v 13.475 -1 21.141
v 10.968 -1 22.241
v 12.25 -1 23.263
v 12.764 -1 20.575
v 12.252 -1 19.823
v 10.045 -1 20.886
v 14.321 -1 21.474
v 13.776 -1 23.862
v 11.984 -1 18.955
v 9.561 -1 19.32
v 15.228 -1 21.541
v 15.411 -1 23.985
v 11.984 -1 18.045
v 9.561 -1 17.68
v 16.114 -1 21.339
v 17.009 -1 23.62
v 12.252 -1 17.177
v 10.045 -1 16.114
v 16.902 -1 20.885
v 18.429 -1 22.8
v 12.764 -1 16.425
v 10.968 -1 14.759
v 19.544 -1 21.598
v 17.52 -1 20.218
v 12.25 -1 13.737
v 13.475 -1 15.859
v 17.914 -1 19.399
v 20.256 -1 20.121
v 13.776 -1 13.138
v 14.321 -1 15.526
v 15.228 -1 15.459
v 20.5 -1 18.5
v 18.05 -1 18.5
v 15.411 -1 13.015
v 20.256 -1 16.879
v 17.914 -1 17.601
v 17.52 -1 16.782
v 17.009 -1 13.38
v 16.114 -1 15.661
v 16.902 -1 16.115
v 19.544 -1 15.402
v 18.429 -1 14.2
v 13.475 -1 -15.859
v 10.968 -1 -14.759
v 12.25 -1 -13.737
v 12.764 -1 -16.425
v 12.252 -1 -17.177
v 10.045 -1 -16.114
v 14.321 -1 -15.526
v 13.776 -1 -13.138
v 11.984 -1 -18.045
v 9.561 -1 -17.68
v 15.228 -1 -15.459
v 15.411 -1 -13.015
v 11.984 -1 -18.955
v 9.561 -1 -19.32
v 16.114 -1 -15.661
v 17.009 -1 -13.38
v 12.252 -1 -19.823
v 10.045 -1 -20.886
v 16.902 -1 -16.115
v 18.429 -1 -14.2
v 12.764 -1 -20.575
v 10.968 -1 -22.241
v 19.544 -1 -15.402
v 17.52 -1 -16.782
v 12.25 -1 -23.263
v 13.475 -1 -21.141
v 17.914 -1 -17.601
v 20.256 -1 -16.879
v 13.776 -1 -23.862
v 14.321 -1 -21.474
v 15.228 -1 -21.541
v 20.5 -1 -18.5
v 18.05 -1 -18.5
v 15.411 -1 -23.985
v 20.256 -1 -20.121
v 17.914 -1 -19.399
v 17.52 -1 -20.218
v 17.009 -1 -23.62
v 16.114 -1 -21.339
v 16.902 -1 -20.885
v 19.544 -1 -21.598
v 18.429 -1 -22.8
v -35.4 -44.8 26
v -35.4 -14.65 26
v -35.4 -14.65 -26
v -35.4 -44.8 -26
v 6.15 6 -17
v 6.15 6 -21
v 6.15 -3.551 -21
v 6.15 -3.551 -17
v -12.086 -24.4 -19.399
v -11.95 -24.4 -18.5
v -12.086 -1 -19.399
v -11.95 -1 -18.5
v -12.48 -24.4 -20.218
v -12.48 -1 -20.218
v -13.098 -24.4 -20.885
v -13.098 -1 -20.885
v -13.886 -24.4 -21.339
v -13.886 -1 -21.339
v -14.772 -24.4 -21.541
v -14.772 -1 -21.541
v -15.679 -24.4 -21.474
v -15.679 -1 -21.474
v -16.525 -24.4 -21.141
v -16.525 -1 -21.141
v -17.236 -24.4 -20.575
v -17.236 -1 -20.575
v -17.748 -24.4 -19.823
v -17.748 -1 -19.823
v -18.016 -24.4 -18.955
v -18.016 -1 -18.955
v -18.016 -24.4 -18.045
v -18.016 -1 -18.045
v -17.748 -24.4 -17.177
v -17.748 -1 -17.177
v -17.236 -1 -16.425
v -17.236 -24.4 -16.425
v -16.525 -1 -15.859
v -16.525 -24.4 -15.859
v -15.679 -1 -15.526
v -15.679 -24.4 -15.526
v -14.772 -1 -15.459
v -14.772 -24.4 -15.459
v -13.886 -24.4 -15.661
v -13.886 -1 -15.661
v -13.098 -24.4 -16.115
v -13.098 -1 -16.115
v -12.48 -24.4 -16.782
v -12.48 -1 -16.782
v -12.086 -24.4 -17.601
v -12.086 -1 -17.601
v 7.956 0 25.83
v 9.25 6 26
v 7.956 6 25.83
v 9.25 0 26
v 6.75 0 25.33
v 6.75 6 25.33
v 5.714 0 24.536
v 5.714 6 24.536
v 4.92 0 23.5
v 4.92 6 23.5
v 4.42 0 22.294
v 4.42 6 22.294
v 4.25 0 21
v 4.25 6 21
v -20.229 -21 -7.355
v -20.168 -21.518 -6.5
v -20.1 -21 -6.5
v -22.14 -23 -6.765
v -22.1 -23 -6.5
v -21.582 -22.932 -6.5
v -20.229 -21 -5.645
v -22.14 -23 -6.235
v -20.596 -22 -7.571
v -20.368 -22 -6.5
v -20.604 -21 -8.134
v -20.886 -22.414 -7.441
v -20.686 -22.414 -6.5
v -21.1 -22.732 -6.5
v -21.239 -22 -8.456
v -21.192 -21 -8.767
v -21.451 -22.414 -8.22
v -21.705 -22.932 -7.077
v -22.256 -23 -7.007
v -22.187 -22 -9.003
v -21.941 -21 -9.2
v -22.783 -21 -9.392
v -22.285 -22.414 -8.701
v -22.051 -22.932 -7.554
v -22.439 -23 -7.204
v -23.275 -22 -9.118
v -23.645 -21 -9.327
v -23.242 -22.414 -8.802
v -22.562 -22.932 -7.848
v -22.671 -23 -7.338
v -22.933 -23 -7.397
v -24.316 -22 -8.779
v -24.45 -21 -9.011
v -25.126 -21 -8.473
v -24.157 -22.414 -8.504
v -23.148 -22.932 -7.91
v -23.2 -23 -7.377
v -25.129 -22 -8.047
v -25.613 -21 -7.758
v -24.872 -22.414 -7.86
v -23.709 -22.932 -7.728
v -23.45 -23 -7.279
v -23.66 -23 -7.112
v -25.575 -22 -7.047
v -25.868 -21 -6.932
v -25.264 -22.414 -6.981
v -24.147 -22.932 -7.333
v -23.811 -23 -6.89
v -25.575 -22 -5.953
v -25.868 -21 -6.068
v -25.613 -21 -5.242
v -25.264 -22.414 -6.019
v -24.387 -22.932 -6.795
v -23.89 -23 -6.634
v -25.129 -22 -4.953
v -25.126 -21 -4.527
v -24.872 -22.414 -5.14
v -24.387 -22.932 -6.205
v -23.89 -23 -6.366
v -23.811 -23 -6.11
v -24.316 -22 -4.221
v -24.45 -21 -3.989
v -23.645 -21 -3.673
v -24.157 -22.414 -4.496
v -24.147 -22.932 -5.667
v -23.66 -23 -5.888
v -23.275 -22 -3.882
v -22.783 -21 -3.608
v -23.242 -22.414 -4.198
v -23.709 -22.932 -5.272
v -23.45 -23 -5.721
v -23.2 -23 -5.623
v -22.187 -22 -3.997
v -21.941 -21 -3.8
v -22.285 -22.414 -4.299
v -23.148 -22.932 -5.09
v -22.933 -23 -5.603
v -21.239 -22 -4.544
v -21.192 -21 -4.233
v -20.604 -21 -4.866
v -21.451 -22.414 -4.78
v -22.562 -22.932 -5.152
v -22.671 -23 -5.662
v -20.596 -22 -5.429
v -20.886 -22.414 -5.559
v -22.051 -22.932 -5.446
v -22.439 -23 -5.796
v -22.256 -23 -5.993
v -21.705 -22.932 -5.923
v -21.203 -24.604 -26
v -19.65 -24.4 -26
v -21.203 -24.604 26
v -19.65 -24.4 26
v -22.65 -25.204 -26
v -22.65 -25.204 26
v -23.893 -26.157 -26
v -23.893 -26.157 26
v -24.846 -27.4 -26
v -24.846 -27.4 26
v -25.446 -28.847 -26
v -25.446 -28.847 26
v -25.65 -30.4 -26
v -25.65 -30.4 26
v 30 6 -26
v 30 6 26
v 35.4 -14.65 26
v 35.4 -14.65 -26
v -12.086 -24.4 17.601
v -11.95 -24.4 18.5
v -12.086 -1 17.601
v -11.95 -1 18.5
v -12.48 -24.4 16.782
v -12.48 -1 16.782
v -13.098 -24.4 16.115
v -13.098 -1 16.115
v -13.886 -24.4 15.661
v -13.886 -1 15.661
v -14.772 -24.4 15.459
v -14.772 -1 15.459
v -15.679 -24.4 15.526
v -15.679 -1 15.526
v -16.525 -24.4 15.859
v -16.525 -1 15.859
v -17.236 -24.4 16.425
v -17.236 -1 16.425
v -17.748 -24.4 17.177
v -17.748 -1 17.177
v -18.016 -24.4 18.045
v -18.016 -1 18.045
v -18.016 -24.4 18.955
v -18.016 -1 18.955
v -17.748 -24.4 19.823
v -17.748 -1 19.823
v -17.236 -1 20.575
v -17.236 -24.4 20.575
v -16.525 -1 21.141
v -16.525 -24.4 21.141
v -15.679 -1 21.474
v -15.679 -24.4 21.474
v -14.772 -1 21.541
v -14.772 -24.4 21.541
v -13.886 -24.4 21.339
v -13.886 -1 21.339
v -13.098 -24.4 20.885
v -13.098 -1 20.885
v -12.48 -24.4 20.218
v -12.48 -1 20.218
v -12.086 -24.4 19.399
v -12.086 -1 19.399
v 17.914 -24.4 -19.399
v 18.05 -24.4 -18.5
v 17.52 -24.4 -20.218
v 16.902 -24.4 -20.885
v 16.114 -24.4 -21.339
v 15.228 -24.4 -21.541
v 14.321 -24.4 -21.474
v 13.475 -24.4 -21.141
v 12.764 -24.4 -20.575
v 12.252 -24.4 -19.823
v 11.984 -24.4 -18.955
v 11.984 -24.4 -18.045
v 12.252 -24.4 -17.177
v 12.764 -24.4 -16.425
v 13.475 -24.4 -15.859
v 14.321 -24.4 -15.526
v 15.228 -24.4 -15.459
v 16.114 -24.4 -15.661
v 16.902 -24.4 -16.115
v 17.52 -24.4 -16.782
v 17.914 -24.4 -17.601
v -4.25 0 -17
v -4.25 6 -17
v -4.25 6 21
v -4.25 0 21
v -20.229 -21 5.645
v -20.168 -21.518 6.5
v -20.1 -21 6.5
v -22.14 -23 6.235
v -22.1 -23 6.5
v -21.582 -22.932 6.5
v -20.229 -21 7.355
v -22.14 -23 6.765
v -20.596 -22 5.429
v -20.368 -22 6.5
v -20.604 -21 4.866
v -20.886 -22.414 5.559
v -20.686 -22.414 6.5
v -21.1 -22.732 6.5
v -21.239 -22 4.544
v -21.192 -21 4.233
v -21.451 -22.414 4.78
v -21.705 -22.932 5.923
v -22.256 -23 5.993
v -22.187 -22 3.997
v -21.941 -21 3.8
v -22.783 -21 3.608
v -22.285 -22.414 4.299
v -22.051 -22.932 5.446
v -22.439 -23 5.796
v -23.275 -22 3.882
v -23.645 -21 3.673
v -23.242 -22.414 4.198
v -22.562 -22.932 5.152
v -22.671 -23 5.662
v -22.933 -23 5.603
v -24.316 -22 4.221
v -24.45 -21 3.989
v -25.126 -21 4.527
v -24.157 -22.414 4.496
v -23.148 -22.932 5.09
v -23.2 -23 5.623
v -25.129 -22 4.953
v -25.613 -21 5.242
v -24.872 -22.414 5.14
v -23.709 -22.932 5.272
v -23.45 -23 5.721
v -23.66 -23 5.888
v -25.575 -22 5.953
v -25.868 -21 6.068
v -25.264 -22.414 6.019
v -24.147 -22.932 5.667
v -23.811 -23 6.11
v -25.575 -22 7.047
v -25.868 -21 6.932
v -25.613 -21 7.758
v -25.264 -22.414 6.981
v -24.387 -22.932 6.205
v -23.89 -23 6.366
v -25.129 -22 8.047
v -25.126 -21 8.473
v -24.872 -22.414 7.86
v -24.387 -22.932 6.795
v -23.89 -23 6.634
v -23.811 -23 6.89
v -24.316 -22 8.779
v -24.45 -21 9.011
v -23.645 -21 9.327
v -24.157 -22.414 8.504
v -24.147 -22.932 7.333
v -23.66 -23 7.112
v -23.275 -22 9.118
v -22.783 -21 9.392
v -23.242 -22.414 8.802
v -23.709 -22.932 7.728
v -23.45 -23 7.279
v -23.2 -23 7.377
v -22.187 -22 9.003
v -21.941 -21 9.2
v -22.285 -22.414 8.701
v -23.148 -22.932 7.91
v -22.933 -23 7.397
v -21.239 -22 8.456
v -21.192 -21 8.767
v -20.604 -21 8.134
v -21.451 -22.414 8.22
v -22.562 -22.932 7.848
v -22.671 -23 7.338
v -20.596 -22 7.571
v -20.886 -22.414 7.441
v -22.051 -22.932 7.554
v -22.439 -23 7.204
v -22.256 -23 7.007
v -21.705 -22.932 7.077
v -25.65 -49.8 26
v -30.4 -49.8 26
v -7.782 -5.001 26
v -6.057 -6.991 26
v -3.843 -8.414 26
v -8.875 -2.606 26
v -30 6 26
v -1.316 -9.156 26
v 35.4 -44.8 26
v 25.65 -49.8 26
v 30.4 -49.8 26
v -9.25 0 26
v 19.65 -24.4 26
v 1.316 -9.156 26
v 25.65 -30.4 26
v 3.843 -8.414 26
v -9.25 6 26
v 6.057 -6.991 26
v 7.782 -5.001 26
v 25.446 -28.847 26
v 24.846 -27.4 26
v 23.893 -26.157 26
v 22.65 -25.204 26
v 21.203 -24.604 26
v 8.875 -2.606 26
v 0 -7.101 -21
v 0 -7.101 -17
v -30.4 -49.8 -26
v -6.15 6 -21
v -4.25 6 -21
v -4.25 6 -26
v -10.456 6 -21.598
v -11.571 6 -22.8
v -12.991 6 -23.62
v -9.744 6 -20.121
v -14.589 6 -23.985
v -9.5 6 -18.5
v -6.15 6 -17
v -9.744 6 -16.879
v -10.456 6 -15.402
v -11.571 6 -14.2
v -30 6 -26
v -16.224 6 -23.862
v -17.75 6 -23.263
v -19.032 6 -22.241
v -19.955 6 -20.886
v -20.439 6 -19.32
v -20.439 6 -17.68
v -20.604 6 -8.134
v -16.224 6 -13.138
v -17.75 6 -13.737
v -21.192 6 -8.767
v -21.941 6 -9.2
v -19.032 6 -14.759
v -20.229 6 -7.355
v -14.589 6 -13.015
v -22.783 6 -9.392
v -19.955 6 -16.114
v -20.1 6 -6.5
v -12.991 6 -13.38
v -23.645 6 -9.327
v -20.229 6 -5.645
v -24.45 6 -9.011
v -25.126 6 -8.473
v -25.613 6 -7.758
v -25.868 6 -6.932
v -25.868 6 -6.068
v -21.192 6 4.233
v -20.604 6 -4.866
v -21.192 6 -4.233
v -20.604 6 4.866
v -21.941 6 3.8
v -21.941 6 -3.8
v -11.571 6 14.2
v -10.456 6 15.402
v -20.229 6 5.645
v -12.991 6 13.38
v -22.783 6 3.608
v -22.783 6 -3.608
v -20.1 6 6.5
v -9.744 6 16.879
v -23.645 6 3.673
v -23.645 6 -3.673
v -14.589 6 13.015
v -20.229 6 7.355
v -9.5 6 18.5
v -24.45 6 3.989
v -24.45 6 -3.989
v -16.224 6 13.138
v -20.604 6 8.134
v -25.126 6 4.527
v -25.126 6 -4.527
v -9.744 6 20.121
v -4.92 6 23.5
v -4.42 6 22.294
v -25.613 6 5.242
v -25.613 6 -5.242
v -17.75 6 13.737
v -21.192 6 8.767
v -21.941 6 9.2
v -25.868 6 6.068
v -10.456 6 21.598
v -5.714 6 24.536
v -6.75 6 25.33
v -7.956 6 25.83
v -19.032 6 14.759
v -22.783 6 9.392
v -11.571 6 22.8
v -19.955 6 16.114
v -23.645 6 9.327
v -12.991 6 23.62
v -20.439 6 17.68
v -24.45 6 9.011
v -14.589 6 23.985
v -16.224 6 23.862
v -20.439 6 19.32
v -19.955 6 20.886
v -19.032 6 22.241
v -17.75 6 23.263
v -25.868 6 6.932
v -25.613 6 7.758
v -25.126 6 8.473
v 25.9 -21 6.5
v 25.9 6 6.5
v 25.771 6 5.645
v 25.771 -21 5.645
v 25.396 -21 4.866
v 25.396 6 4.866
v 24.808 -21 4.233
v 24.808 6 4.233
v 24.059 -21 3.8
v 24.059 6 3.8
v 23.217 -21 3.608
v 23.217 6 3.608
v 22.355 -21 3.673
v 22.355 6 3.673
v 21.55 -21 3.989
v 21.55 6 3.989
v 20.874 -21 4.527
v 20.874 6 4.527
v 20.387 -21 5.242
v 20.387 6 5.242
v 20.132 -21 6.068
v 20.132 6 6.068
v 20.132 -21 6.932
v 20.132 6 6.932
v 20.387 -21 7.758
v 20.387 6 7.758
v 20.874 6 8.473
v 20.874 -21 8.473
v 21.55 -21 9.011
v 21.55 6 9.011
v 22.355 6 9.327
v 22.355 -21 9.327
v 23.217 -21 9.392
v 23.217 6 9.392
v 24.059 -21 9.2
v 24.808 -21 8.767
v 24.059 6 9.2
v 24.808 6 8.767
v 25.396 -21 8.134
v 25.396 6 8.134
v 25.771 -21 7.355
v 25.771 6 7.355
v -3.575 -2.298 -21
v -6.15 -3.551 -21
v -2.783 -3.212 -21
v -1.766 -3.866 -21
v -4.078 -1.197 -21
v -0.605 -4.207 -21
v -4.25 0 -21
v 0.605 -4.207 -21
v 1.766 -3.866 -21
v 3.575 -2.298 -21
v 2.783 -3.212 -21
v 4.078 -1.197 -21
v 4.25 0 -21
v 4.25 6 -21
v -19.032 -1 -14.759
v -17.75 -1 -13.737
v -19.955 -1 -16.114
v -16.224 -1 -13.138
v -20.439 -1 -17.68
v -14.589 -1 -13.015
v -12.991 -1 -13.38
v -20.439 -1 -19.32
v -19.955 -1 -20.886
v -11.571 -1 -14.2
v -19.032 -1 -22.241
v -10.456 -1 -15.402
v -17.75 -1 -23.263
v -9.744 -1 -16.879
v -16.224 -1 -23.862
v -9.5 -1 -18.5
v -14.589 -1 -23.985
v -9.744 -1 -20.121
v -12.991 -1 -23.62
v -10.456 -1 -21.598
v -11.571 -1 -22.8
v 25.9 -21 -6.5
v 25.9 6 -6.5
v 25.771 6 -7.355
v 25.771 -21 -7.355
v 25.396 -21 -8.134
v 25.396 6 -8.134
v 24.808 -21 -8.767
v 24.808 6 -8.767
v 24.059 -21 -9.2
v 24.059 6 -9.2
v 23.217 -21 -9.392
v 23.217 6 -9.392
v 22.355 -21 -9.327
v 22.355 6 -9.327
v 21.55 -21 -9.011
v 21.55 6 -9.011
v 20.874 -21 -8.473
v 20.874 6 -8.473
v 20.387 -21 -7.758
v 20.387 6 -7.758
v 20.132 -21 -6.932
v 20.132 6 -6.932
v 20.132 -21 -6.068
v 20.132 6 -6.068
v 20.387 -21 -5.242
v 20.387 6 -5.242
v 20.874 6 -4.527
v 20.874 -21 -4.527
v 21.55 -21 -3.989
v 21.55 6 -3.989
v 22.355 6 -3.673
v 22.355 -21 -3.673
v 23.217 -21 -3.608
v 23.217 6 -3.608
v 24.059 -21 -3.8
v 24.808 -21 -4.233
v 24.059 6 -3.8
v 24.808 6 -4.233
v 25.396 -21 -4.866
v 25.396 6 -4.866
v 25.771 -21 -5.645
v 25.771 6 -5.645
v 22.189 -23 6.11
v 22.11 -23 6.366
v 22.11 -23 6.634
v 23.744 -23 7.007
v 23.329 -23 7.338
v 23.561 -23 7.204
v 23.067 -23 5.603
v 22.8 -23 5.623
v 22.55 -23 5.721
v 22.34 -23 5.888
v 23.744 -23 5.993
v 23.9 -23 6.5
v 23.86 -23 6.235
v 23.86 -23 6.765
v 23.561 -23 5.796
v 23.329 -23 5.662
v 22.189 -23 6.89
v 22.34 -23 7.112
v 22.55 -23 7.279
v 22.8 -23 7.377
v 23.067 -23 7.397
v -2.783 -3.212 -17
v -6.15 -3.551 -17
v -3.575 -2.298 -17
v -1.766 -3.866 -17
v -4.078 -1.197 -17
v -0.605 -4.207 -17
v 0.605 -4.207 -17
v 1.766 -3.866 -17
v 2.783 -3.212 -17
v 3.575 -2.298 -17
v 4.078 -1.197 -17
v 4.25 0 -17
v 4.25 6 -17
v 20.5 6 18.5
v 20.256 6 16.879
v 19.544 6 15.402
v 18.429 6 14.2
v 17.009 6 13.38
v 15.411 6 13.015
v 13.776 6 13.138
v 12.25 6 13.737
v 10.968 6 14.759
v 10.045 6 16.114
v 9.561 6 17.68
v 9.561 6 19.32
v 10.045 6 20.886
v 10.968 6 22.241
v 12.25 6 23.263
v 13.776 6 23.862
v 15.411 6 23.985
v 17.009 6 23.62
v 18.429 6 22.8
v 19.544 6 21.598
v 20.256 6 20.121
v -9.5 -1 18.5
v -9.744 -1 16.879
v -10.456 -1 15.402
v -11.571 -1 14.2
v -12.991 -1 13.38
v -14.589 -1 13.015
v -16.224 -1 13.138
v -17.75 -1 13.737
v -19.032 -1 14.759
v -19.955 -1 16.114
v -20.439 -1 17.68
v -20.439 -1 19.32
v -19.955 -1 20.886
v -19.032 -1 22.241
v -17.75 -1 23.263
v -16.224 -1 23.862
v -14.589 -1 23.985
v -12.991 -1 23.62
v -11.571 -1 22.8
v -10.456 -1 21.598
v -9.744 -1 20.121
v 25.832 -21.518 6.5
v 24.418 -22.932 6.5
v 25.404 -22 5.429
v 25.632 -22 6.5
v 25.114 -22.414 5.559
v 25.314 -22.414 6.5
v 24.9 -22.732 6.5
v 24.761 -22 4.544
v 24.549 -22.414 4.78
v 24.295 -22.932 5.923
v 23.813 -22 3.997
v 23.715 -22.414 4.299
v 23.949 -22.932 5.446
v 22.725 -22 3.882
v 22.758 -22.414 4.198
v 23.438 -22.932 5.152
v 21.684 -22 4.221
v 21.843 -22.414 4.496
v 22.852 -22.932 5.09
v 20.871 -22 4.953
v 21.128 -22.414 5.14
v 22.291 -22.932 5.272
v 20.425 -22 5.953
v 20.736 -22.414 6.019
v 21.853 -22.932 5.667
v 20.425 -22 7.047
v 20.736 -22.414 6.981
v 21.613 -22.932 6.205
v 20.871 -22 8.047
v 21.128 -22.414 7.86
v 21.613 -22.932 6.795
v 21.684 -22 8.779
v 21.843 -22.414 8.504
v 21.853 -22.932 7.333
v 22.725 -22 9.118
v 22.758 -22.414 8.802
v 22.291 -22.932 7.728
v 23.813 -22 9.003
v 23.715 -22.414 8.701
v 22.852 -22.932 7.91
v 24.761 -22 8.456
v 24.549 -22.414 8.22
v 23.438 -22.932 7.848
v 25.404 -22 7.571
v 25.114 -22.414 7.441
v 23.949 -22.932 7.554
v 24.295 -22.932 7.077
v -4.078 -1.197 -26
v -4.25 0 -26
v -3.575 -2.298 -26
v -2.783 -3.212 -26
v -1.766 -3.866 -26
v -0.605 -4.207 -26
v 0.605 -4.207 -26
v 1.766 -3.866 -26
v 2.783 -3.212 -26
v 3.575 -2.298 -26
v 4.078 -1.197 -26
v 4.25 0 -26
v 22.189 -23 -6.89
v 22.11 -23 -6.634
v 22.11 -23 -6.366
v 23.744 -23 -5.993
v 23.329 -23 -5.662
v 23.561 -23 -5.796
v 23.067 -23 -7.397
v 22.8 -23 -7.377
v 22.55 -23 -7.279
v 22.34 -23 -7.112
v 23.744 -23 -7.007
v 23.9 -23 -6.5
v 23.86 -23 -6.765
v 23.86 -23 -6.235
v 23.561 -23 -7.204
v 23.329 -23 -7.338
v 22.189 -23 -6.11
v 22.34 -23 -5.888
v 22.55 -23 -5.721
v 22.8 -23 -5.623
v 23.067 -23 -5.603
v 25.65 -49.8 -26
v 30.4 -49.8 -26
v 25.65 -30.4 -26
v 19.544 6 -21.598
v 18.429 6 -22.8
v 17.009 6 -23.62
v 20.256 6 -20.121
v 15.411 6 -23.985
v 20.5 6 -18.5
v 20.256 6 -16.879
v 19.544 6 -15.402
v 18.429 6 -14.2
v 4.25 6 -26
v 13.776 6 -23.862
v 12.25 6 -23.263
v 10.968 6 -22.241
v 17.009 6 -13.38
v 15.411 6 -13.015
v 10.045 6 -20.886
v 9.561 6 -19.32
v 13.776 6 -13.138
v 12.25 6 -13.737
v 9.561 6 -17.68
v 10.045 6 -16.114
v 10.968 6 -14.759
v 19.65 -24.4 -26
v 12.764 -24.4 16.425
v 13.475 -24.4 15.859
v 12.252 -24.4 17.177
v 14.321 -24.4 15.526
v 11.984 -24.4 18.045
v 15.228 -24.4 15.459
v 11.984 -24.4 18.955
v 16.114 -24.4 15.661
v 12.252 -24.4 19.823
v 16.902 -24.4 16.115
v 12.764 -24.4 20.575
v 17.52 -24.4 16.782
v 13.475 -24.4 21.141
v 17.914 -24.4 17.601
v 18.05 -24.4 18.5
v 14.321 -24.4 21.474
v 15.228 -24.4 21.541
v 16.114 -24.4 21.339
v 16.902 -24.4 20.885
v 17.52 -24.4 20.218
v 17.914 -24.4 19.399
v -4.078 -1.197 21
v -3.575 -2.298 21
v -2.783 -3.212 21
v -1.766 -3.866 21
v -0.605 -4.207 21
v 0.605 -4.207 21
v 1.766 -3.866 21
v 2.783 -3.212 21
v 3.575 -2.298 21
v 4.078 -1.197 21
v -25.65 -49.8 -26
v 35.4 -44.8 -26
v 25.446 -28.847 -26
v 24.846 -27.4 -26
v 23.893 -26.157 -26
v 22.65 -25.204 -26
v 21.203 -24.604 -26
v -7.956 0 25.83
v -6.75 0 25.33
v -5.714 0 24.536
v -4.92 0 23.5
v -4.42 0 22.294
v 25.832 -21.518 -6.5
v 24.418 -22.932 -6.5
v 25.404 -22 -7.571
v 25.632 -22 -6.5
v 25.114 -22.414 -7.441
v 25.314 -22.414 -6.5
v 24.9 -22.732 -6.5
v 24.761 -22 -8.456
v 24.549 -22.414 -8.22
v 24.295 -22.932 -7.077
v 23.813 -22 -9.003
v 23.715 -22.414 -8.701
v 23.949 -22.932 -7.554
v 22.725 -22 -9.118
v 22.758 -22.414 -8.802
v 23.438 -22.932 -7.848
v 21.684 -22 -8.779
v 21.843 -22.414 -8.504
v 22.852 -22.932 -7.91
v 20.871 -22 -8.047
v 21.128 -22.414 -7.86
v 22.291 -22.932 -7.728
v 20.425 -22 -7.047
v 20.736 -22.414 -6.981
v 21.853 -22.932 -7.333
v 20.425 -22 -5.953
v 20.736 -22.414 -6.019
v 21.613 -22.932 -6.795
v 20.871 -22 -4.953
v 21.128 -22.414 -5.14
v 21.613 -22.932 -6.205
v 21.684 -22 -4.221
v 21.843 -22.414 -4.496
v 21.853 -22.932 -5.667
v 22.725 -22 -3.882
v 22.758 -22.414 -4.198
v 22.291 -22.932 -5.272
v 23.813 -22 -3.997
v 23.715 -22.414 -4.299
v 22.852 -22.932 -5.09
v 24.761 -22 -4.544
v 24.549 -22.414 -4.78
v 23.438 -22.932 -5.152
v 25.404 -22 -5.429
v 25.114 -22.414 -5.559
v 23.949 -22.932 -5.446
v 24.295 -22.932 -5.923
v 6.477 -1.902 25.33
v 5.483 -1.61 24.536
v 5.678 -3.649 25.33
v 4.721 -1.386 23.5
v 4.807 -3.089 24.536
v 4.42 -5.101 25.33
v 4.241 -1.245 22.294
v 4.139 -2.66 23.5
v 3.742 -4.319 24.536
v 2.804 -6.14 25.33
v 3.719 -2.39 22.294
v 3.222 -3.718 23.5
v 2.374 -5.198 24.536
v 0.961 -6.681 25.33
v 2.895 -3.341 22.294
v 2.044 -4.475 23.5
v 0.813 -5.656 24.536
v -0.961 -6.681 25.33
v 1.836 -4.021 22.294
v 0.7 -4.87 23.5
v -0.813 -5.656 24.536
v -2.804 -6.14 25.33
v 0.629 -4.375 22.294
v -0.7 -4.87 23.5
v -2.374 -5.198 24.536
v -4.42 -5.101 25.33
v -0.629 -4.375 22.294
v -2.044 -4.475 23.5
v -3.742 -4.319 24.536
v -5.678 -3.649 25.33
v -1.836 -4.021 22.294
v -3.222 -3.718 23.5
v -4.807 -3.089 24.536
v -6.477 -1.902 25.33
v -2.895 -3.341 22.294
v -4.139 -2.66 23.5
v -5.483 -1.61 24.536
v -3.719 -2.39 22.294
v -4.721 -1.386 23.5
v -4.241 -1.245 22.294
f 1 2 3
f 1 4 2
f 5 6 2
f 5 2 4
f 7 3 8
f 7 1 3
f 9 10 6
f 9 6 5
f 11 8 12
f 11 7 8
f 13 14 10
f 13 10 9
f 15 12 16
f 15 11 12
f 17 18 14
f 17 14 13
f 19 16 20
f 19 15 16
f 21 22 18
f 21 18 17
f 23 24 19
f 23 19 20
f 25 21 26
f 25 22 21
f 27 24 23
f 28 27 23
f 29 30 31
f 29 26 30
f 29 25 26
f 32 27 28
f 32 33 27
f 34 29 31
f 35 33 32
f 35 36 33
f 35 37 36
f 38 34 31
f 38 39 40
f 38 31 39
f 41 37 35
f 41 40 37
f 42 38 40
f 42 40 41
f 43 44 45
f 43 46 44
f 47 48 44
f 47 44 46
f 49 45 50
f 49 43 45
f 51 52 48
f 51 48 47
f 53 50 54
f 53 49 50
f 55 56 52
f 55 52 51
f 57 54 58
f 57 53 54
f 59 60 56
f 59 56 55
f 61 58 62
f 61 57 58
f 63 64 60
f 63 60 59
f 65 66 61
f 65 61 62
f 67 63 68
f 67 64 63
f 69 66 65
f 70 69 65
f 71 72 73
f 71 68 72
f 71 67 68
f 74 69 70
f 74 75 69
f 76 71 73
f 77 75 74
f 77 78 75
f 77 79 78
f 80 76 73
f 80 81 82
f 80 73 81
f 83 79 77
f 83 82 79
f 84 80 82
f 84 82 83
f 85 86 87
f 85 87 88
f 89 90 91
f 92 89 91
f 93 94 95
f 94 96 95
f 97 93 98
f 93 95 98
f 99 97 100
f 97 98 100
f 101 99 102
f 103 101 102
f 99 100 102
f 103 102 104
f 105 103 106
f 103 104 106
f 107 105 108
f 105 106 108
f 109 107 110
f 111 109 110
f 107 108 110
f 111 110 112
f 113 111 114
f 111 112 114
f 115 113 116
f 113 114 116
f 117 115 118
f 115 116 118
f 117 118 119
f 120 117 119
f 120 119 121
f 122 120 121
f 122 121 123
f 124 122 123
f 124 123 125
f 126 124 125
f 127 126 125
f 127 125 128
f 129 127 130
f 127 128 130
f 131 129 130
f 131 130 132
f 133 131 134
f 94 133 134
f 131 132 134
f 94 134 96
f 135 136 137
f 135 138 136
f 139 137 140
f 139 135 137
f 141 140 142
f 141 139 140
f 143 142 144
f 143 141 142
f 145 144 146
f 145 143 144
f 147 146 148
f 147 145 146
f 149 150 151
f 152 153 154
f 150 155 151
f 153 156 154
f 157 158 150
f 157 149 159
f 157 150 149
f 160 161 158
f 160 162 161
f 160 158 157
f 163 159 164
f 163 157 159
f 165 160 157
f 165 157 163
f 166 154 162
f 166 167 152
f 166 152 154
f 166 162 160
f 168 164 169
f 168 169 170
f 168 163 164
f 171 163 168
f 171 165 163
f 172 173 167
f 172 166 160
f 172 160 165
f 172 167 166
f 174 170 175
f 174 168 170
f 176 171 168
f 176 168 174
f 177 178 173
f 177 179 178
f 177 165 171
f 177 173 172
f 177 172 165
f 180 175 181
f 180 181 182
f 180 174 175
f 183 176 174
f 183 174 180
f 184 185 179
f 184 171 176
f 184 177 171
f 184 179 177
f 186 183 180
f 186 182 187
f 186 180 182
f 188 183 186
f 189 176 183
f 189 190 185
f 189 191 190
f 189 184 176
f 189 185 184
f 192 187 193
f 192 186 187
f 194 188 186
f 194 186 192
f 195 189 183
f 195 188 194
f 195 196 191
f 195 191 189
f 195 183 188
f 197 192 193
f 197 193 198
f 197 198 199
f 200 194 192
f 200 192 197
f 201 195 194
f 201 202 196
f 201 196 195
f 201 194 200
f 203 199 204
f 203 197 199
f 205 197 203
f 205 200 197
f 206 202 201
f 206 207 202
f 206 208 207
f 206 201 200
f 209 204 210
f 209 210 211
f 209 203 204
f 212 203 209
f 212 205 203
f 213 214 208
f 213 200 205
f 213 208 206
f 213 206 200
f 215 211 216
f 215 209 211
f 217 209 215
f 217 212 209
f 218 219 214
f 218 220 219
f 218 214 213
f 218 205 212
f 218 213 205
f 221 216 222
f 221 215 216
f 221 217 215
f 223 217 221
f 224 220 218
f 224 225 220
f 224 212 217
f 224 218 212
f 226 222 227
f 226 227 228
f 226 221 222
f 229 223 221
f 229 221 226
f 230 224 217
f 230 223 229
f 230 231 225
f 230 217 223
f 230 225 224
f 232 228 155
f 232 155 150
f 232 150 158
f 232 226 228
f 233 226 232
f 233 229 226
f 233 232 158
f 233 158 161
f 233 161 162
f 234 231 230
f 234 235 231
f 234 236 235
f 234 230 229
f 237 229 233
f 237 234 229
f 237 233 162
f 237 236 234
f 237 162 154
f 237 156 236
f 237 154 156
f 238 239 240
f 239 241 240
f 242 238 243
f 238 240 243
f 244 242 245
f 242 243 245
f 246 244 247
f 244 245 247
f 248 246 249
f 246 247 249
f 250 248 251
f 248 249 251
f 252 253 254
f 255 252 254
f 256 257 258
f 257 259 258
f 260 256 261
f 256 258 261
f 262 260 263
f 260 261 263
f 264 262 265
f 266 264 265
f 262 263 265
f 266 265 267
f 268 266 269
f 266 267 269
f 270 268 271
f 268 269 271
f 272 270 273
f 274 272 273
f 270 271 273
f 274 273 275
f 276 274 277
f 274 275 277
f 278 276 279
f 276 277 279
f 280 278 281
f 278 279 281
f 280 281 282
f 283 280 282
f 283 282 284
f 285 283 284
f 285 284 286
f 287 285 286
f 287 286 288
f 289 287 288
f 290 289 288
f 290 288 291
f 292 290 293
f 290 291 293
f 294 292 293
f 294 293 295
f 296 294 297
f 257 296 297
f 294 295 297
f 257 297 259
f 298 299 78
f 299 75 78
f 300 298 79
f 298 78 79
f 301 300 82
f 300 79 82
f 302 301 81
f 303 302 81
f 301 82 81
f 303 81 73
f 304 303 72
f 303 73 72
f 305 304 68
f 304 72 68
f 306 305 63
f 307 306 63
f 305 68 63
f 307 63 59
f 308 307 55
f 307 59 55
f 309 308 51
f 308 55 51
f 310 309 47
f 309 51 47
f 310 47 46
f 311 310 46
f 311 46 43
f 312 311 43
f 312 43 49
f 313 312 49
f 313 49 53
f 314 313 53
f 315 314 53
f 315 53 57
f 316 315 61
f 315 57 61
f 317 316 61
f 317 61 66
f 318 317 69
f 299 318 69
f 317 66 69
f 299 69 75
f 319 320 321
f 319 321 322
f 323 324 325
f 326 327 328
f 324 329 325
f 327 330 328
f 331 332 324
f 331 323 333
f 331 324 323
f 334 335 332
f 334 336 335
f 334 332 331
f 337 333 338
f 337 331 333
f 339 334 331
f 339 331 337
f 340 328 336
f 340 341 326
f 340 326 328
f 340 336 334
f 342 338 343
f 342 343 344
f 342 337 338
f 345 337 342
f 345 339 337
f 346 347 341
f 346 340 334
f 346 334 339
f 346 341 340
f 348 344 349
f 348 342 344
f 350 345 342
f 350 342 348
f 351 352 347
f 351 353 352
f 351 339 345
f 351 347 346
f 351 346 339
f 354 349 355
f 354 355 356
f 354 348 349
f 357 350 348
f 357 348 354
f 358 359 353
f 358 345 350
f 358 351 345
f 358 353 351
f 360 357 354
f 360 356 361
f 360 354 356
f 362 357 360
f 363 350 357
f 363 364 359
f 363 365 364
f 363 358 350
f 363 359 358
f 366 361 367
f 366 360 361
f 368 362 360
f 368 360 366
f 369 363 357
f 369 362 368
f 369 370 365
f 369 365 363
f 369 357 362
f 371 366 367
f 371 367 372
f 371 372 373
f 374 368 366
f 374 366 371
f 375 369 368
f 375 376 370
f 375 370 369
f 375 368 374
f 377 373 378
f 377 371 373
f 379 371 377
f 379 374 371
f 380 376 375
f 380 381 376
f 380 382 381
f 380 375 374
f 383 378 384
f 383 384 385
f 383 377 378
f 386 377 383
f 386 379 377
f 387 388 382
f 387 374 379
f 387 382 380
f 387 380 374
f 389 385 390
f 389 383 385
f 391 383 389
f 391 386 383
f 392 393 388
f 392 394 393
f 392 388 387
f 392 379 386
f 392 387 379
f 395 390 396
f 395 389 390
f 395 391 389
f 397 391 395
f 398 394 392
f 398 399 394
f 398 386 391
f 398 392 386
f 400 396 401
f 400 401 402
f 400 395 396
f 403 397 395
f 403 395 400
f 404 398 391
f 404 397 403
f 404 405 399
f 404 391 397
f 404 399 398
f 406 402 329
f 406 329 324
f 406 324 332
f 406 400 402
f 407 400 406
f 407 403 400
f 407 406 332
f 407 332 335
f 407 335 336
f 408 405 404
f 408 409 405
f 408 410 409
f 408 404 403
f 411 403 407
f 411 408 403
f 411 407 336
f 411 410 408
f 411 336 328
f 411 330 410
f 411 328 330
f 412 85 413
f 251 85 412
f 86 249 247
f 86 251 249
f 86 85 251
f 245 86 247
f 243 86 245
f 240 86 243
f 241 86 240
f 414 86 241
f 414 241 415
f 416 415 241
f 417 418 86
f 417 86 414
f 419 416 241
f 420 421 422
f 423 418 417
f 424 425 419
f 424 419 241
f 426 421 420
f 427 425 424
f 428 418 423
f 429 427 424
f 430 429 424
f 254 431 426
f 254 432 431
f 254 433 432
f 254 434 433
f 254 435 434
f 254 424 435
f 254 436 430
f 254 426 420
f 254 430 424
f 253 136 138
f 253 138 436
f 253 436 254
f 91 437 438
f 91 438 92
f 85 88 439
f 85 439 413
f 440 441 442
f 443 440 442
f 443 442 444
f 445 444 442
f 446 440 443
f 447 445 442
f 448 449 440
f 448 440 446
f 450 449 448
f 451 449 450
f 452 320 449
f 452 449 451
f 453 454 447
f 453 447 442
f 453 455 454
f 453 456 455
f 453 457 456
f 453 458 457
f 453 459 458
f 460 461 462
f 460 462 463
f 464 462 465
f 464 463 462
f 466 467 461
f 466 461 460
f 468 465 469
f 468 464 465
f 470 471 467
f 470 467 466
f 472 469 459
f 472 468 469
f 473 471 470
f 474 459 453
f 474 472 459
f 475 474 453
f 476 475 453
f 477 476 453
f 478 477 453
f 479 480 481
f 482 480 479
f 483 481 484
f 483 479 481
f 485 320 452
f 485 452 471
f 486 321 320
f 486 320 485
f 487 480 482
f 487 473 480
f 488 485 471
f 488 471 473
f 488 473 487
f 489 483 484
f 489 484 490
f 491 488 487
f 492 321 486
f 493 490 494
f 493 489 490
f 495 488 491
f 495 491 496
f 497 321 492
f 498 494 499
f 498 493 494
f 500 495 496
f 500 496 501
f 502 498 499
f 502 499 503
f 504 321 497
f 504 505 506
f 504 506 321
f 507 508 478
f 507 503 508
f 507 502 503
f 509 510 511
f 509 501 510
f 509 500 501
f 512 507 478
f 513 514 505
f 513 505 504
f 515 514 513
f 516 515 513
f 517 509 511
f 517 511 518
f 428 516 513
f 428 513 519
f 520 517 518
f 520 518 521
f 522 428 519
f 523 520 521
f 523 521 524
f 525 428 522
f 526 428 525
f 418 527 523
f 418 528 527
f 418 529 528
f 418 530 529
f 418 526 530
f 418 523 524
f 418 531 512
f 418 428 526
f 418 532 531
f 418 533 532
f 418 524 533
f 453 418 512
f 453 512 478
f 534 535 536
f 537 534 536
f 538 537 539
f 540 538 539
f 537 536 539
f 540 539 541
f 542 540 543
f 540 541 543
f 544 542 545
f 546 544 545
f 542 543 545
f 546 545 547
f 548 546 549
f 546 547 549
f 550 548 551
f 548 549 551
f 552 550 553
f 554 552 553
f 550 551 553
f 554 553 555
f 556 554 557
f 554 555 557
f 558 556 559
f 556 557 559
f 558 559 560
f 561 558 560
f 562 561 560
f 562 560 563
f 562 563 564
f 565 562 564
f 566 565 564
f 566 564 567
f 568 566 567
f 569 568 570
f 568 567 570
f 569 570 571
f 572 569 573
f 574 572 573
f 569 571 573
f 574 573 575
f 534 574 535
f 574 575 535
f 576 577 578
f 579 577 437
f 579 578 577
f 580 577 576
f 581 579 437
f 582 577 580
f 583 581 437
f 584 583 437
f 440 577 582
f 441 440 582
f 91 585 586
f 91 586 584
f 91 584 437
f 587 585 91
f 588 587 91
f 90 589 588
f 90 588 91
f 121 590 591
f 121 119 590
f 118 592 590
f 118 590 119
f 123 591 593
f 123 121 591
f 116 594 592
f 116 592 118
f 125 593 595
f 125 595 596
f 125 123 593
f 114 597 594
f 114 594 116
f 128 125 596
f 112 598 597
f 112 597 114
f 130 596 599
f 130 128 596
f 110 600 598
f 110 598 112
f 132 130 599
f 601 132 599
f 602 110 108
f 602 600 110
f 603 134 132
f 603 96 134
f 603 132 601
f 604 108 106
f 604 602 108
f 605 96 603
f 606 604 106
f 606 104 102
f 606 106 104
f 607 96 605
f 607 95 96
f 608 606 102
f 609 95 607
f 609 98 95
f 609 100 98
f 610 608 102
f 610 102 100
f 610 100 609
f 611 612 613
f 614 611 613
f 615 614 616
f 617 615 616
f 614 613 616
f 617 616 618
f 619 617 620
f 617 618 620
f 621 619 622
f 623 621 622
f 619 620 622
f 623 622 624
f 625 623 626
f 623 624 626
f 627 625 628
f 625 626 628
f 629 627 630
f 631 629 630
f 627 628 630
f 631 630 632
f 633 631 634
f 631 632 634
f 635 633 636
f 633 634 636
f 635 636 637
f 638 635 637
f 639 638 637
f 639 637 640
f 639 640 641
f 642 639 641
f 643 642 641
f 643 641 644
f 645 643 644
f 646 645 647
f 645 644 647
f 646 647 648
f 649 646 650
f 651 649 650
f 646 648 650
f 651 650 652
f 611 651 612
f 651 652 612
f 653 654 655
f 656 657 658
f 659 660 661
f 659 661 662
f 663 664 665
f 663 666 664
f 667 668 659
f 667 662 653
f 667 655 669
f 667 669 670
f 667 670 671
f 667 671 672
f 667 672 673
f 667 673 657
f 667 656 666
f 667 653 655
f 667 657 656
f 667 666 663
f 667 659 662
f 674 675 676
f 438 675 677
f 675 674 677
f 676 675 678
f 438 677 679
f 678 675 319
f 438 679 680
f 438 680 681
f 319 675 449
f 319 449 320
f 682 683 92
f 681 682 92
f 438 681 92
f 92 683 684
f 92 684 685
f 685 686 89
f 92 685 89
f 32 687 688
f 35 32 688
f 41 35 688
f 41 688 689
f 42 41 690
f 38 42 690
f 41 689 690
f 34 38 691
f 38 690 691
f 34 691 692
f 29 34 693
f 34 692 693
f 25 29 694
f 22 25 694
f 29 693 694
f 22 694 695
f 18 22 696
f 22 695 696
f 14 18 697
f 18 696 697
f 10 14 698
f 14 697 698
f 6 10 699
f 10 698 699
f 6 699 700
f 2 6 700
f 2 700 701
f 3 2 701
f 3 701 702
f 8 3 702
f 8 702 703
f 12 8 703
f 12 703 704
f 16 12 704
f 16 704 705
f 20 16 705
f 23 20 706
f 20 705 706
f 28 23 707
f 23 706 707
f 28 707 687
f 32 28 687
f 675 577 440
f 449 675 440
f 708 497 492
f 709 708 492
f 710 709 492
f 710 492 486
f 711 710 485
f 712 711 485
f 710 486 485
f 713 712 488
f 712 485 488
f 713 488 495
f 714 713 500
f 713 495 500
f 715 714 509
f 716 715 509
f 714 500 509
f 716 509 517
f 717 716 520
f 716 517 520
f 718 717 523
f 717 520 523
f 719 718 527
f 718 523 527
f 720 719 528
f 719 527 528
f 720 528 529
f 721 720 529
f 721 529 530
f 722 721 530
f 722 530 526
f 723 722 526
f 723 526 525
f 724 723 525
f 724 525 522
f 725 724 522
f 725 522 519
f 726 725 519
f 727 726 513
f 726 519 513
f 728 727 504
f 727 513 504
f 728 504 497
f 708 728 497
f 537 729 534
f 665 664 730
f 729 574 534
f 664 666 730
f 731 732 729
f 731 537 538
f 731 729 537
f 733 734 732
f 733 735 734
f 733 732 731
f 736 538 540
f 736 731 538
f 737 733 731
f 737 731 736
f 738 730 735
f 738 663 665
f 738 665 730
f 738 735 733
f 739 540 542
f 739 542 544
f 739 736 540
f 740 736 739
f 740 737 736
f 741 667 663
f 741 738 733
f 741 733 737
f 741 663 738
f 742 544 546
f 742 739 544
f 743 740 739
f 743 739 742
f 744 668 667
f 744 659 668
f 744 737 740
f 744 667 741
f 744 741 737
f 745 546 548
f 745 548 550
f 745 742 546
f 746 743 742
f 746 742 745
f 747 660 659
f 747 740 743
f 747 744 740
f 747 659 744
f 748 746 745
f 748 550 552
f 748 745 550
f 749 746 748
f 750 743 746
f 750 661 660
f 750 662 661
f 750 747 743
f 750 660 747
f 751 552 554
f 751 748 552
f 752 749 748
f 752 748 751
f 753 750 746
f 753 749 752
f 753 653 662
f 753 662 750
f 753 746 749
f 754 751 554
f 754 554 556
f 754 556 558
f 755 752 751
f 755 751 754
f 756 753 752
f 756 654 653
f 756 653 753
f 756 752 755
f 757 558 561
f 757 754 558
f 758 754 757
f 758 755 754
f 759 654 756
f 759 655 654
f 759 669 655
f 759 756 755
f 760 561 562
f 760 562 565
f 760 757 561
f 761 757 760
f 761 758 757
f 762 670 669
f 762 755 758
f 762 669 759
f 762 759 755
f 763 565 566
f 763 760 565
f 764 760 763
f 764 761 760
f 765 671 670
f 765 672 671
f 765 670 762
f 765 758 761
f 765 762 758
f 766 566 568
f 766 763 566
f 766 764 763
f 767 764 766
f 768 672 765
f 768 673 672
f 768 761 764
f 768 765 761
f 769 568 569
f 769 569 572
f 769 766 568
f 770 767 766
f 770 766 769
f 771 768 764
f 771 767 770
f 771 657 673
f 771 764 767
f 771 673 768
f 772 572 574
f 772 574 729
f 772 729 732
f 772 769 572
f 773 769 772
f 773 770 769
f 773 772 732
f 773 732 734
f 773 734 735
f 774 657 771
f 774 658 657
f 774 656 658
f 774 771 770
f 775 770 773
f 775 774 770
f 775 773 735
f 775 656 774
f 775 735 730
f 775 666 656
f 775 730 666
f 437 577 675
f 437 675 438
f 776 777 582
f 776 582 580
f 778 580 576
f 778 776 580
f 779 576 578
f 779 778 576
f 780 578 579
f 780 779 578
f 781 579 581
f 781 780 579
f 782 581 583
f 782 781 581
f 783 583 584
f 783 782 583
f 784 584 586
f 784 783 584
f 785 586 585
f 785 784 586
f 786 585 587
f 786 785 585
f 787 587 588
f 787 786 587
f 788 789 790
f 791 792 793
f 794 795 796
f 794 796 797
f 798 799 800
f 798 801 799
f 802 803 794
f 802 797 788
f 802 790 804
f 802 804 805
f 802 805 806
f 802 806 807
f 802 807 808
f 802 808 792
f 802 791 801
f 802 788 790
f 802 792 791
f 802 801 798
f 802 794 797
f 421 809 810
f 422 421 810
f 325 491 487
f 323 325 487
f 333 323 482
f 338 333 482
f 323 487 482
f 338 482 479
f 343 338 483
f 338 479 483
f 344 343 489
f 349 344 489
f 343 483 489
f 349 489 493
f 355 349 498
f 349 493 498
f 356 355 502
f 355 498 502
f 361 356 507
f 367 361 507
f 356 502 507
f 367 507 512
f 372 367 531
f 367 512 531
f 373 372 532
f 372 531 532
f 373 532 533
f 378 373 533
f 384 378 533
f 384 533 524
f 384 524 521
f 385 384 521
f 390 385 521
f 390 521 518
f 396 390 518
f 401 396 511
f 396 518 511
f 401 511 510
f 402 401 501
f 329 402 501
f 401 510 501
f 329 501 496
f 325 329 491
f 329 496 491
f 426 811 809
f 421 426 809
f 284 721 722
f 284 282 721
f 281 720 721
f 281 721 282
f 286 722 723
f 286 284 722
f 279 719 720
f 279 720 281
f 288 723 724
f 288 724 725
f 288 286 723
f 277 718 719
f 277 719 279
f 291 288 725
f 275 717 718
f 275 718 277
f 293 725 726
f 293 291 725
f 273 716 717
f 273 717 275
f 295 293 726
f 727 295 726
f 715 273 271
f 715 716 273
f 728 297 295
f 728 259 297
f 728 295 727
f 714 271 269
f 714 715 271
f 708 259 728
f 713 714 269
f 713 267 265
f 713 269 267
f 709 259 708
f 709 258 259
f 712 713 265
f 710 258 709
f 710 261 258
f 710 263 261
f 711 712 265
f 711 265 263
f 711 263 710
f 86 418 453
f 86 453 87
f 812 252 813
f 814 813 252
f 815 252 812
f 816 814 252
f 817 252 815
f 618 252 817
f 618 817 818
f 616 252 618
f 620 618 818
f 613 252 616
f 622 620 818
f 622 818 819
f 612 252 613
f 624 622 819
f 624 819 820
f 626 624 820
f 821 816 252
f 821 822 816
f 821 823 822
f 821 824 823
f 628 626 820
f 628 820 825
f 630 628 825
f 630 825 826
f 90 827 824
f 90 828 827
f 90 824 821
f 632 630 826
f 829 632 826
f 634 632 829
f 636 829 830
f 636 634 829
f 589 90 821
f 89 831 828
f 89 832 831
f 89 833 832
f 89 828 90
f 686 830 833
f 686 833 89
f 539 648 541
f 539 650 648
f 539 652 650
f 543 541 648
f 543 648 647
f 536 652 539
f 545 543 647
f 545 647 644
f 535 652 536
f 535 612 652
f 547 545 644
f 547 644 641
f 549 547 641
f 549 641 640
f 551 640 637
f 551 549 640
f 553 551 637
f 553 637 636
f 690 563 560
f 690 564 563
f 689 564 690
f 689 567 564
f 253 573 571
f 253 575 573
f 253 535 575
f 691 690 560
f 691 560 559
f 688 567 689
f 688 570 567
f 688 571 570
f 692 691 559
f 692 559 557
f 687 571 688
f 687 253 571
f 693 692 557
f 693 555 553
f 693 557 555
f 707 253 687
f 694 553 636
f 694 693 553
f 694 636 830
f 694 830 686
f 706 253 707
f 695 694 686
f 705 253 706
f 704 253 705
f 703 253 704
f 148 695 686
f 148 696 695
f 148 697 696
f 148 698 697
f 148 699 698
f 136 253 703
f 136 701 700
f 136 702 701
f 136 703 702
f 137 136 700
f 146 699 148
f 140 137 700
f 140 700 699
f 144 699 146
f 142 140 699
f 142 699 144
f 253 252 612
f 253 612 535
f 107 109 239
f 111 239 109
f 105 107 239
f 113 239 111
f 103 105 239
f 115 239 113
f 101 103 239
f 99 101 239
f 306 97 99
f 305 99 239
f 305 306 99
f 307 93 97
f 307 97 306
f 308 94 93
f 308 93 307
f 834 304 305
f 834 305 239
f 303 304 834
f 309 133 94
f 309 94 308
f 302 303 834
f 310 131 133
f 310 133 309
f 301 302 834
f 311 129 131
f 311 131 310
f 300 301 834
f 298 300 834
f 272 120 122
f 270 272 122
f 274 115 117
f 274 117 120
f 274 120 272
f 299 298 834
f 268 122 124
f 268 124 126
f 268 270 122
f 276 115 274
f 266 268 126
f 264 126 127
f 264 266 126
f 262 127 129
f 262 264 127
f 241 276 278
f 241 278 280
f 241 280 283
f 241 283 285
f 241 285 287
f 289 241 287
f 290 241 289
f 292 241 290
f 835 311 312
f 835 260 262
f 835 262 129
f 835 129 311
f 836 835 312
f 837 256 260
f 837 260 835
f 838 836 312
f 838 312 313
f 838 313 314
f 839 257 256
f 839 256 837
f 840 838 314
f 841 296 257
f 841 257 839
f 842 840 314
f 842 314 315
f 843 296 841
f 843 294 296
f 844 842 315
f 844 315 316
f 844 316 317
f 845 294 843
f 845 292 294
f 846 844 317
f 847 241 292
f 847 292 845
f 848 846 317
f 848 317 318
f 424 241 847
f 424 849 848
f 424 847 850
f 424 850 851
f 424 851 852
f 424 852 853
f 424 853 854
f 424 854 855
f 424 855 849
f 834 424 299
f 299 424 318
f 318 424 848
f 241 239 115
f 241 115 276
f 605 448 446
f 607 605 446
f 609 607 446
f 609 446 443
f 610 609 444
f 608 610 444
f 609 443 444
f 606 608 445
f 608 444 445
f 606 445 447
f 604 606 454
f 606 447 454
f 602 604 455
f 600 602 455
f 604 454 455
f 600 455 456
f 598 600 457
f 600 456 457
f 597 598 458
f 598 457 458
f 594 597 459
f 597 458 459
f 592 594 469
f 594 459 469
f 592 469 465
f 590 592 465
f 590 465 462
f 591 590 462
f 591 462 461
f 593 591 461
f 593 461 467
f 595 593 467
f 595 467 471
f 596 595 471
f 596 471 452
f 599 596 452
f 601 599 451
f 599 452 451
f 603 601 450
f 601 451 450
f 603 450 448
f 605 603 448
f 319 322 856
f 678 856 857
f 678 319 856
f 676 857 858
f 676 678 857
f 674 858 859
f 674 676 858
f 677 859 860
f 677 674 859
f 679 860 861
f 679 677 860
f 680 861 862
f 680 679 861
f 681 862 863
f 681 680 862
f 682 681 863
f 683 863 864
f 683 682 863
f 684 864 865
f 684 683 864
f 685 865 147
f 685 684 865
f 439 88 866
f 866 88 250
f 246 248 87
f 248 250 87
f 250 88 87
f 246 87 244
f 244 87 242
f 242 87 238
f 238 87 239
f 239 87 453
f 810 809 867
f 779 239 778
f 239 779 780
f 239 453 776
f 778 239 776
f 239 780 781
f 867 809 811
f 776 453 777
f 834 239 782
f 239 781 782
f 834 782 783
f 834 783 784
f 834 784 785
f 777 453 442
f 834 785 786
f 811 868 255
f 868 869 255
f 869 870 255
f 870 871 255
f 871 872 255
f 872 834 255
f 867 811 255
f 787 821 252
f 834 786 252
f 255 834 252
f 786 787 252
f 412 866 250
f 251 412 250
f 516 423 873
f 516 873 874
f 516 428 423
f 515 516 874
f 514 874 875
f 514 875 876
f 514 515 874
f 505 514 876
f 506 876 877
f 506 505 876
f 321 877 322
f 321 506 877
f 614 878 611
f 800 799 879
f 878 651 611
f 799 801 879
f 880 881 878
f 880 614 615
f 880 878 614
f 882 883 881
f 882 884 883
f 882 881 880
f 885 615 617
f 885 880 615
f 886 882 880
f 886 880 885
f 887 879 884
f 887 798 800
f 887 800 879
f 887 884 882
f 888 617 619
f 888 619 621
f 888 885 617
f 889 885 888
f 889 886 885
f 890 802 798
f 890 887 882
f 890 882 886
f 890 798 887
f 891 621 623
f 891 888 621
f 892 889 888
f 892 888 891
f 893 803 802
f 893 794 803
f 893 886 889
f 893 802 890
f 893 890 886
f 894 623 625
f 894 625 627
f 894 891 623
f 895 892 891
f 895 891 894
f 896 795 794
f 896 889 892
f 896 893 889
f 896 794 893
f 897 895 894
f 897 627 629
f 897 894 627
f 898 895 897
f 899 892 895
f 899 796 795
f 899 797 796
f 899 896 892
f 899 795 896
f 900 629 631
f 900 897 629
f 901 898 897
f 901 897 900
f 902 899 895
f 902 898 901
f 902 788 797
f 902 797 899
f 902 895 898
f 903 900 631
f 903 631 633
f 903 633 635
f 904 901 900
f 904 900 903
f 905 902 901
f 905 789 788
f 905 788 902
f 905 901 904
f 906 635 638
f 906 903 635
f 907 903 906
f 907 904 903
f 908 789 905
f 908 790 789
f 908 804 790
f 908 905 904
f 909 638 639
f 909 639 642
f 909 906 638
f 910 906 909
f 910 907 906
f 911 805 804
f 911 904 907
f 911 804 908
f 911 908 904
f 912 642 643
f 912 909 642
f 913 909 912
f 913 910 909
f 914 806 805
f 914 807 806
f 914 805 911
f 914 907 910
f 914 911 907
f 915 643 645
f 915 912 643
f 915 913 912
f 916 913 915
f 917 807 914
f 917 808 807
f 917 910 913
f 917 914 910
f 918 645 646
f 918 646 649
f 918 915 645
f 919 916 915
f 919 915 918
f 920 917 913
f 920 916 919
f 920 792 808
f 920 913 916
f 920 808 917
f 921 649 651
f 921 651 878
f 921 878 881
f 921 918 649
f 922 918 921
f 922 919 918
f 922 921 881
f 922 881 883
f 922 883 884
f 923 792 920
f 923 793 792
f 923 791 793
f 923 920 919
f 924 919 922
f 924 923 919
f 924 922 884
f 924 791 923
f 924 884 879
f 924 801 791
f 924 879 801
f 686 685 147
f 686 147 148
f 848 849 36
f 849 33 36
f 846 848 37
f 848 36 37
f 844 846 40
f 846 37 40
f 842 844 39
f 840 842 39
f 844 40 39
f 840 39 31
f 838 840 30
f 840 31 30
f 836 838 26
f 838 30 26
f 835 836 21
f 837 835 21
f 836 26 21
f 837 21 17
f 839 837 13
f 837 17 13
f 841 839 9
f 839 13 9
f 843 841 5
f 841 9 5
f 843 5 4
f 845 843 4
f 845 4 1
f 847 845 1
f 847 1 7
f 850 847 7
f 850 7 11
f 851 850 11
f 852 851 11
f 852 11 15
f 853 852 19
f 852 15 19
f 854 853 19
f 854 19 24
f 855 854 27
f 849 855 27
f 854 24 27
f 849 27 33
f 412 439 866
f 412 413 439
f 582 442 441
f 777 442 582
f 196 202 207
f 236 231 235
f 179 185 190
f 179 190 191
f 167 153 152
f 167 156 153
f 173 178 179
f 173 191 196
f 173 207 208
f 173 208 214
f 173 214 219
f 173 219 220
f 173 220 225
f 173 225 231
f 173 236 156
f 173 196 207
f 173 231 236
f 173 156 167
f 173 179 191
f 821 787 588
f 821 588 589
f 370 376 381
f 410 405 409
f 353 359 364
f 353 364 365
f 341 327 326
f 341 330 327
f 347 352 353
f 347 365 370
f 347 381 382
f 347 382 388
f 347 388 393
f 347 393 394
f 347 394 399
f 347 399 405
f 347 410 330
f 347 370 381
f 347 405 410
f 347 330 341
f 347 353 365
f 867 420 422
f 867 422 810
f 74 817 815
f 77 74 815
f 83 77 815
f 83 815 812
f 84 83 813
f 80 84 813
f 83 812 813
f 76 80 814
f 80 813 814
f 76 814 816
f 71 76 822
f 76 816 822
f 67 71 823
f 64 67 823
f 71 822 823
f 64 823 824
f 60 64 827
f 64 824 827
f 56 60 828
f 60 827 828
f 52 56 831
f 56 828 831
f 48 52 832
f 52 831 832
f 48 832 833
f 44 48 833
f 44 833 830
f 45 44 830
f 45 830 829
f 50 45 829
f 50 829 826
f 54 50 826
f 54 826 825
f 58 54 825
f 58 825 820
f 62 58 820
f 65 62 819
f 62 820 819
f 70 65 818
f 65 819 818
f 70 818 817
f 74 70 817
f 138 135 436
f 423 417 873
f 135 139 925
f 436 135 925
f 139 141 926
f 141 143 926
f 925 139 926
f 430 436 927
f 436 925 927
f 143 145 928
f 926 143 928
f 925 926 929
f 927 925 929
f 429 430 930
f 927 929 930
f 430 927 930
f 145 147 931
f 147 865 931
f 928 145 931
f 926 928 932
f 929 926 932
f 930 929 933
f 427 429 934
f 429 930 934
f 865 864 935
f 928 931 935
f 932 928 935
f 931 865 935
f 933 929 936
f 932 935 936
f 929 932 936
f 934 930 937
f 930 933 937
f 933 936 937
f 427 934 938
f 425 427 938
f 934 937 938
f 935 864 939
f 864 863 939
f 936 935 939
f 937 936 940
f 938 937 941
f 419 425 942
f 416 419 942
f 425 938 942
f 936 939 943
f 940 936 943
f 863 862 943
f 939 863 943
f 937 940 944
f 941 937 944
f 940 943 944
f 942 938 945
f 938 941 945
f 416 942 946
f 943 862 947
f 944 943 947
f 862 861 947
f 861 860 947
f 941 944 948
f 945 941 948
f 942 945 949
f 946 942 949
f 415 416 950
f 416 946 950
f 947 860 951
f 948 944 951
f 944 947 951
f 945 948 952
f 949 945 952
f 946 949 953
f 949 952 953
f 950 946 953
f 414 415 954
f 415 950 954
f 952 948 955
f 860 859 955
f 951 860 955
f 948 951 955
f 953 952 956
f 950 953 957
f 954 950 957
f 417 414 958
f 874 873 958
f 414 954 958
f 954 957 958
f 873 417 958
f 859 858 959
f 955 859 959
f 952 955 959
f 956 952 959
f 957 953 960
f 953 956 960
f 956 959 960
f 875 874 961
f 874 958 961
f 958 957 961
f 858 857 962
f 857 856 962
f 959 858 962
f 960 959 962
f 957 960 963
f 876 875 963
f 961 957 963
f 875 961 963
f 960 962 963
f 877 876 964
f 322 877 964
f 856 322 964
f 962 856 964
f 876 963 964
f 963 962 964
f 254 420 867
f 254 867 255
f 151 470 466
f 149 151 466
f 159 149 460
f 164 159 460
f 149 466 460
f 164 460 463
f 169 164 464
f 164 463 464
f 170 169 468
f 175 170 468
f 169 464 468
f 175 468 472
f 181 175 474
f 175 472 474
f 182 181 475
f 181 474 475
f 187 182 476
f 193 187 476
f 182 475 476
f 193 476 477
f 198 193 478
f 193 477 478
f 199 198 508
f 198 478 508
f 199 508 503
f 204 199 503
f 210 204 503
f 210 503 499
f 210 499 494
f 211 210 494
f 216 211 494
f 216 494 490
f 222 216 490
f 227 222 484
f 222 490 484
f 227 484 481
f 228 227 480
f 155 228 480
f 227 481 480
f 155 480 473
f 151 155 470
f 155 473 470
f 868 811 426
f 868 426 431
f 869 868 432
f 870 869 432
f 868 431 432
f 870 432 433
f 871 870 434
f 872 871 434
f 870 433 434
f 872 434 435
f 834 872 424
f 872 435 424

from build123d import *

# Parameters (mm, degrees)
BOSS_EXTRUDE1_DEPTH = 26
CUT_EXTRUDE8_DEPTH  = 53
FILLET1_R           = 6
SKETCH2_R           = 2.9
SKETCH2_R_2         = 3.05
CUT_EXTRUDE1_DEPTH  = 29
SKETCH3_R           = 5.5
CUT_EXTRUDE2_DEPTH  = 7
CHAMFER2_SIZE       = 5
CUT_EXTRUDE9_DEPTH  = 53
CUT_EXTRUDE10_START = -5
CUT_EXTRUDE10_DEPTH = 4
FILLET2_R           = 5
SKETCH12_R          = 3.05
CUT_EXTRUDE11_DEPTH = 4
FILLET3_R           = 2


with BuildPart() as part:
    # Sketch1 → Boss-Extrude1 (new body, symmetric)
    with BuildSketch(Plane.XY):
        Polygon((35.4, 6), (-35.4, 6), (-35.4, -49.8), (-25.65, -49.8), (-25.65, -24.4), (25.65, -24.4), (25.65, -49.8), (35.4, -49.8), align=None)
    extrude(amount=BOSS_EXTRUDE1_DEPTH, both=True)

    # Sketch9 → Cut-Extrude8 (cut, through all)
    with BuildSketch(Plane.XY.offset(26)):
        Polygon((-30, 6), (-35.4, -14.65), (-35.4, 6), align=None)
        Polygon((35.4, 6), (30, 6), (35.4, -14.65), align=None)
    extrude(amount=-CUT_EXTRUDE8_DEPTH, mode=Mode.SUBTRACT)

    # Fillet1
    fillet1_edges = [part.edges().sort_by_distance(p)[0] for p in [
        (25.65, -24.4, 0),
        (-25.65, -24.4, 0),
    ]]
    fillet(fillet1_edges, radius=FILLET1_R)

    # Sketch2 → Cut-Extrude1 (cut)
    with BuildSketch(Plane(origin=(0, 6, 0), x_dir=(1, 0, 0), z_dir=(0, 1, 0))):
        with Locations((-23, 6.5)):
            Circle(SKETCH2_R)
        with Locations((-23, -6.5)):
            Circle(SKETCH2_R)
        with Locations((-15, 18.5)):
            Circle(SKETCH2_R_2)
        with Locations((23, -6.5)):
            Circle(SKETCH2_R)
        with Locations((23, 6.5)):
            Circle(SKETCH2_R)
        with Locations((15, 18.5)):
            Circle(SKETCH2_R_2)
        with Locations((15, -18.5)):
            Circle(SKETCH2_R_2)
        with Locations((-15, -18.5)):
            Circle(SKETCH2_R_2)
    extrude(amount=-CUT_EXTRUDE1_DEPTH, mode=Mode.SUBTRACT)

    # Sketch3 → Cut-Extrude2 (cut)
    with BuildSketch(Plane(origin=(0, 6, 0), x_dir=(1, 0, 0), z_dir=(0, 1, 0))):
        with Locations((-15, 18.5)):
            Circle(SKETCH3_R)
        with Locations((15, 18.5)):
            Circle(SKETCH3_R)
        with Locations((-15, -18.5)):
            Circle(SKETCH3_R)
        with Locations((15, -18.5)):
            Circle(SKETCH3_R)
    extrude(amount=-CUT_EXTRUDE2_DEPTH, mode=Mode.SUBTRACT)

    # Chamfer2
    chamfer2_edges = [part.edges().sort_by_distance(p)[0] for p in [
        (35.4, -49.8, 0),
        (-35.4, -49.8, 0),
    ]]
    chamfer(chamfer2_edges, length=CHAMFER2_SIZE)

    # Sketch10 → Cut-Extrude9 (cut, through all)
    with BuildSketch(Plane(origin=(0, 0, -26), x_dir=(-1, 0, 0), z_dir=(0, 0, -1))):
        with BuildLine():
            Line((-4.25, 0), (-4.25, 11.491510708))
            Line((-4.25, 11.491510708), (4.25, 11.491510708))
            Line((4.25, 11.491510708), (4.25, 0))
            ThreePointArc((4.25, 0), (0, -4.25), (-4.25, 0))
        make_face()
    extrude(amount=-CUT_EXTRUDE9_DEPTH, mode=Mode.SUBTRACT)

    # Sketch11 → Cut-Extrude10 (cut)
    with BuildSketch(Plane(origin=(0, 0, -26), x_dir=(-1, 0, 0), z_dir=(0, 0, -1)).offset(CUT_EXTRUDE10_START)):
        Polygon((-6.15, 3.550704156), (-6.15, 9.910448096), (6.15, 9.910448096), (6.15, 3.550704156), (6.15, -3.550704156), (0, -7.101408311), (-6.15, -3.550704156), align=None)
    extrude(amount=-CUT_EXTRUDE10_DEPTH, mode=Mode.SUBTRACT)

    # Fillet2
    fillet2_edges = [part.edges().sort_by_distance(p)[0] for p in [
        (4.25, 3, 26),
        (-4.25, 3, 26),
        (0, -4.25, 26),
    ]]
    fillet(fillet2_edges, radius=FILLET2_R)

    # Sketch12 → Cut-Extrude11 (cut)
    with BuildSketch(Plane(origin=(0, -23, 0), x_dir=(1, 0, 0), z_dir=(0, 1, 0))):
        with Locations((-15, 18.5)):
            Circle(SKETCH12_R)
        with Locations((15, 18.5)):
            Circle(SKETCH12_R)
        with Locations((15, -18.5)):
            Circle(SKETCH12_R)
        with Locations((-15, -18.5)):
            Circle(SKETCH12_R)
    extrude(amount=-CUT_EXTRUDE11_DEPTH, mode=Mode.SUBTRACT)

    # Fillet3
    fillet3_edges = [part.edges().sort_by_distance(p)[0] for p in [
        (-25.9, -23, -6.5),
        (20.1, -23, -6.5),
        (20.1, -23, 6.5),
        (-25.9, -23, 6.5),
    ]]
    fillet(fillet3_edges, radius=FILLET3_R)


solid = part.part
